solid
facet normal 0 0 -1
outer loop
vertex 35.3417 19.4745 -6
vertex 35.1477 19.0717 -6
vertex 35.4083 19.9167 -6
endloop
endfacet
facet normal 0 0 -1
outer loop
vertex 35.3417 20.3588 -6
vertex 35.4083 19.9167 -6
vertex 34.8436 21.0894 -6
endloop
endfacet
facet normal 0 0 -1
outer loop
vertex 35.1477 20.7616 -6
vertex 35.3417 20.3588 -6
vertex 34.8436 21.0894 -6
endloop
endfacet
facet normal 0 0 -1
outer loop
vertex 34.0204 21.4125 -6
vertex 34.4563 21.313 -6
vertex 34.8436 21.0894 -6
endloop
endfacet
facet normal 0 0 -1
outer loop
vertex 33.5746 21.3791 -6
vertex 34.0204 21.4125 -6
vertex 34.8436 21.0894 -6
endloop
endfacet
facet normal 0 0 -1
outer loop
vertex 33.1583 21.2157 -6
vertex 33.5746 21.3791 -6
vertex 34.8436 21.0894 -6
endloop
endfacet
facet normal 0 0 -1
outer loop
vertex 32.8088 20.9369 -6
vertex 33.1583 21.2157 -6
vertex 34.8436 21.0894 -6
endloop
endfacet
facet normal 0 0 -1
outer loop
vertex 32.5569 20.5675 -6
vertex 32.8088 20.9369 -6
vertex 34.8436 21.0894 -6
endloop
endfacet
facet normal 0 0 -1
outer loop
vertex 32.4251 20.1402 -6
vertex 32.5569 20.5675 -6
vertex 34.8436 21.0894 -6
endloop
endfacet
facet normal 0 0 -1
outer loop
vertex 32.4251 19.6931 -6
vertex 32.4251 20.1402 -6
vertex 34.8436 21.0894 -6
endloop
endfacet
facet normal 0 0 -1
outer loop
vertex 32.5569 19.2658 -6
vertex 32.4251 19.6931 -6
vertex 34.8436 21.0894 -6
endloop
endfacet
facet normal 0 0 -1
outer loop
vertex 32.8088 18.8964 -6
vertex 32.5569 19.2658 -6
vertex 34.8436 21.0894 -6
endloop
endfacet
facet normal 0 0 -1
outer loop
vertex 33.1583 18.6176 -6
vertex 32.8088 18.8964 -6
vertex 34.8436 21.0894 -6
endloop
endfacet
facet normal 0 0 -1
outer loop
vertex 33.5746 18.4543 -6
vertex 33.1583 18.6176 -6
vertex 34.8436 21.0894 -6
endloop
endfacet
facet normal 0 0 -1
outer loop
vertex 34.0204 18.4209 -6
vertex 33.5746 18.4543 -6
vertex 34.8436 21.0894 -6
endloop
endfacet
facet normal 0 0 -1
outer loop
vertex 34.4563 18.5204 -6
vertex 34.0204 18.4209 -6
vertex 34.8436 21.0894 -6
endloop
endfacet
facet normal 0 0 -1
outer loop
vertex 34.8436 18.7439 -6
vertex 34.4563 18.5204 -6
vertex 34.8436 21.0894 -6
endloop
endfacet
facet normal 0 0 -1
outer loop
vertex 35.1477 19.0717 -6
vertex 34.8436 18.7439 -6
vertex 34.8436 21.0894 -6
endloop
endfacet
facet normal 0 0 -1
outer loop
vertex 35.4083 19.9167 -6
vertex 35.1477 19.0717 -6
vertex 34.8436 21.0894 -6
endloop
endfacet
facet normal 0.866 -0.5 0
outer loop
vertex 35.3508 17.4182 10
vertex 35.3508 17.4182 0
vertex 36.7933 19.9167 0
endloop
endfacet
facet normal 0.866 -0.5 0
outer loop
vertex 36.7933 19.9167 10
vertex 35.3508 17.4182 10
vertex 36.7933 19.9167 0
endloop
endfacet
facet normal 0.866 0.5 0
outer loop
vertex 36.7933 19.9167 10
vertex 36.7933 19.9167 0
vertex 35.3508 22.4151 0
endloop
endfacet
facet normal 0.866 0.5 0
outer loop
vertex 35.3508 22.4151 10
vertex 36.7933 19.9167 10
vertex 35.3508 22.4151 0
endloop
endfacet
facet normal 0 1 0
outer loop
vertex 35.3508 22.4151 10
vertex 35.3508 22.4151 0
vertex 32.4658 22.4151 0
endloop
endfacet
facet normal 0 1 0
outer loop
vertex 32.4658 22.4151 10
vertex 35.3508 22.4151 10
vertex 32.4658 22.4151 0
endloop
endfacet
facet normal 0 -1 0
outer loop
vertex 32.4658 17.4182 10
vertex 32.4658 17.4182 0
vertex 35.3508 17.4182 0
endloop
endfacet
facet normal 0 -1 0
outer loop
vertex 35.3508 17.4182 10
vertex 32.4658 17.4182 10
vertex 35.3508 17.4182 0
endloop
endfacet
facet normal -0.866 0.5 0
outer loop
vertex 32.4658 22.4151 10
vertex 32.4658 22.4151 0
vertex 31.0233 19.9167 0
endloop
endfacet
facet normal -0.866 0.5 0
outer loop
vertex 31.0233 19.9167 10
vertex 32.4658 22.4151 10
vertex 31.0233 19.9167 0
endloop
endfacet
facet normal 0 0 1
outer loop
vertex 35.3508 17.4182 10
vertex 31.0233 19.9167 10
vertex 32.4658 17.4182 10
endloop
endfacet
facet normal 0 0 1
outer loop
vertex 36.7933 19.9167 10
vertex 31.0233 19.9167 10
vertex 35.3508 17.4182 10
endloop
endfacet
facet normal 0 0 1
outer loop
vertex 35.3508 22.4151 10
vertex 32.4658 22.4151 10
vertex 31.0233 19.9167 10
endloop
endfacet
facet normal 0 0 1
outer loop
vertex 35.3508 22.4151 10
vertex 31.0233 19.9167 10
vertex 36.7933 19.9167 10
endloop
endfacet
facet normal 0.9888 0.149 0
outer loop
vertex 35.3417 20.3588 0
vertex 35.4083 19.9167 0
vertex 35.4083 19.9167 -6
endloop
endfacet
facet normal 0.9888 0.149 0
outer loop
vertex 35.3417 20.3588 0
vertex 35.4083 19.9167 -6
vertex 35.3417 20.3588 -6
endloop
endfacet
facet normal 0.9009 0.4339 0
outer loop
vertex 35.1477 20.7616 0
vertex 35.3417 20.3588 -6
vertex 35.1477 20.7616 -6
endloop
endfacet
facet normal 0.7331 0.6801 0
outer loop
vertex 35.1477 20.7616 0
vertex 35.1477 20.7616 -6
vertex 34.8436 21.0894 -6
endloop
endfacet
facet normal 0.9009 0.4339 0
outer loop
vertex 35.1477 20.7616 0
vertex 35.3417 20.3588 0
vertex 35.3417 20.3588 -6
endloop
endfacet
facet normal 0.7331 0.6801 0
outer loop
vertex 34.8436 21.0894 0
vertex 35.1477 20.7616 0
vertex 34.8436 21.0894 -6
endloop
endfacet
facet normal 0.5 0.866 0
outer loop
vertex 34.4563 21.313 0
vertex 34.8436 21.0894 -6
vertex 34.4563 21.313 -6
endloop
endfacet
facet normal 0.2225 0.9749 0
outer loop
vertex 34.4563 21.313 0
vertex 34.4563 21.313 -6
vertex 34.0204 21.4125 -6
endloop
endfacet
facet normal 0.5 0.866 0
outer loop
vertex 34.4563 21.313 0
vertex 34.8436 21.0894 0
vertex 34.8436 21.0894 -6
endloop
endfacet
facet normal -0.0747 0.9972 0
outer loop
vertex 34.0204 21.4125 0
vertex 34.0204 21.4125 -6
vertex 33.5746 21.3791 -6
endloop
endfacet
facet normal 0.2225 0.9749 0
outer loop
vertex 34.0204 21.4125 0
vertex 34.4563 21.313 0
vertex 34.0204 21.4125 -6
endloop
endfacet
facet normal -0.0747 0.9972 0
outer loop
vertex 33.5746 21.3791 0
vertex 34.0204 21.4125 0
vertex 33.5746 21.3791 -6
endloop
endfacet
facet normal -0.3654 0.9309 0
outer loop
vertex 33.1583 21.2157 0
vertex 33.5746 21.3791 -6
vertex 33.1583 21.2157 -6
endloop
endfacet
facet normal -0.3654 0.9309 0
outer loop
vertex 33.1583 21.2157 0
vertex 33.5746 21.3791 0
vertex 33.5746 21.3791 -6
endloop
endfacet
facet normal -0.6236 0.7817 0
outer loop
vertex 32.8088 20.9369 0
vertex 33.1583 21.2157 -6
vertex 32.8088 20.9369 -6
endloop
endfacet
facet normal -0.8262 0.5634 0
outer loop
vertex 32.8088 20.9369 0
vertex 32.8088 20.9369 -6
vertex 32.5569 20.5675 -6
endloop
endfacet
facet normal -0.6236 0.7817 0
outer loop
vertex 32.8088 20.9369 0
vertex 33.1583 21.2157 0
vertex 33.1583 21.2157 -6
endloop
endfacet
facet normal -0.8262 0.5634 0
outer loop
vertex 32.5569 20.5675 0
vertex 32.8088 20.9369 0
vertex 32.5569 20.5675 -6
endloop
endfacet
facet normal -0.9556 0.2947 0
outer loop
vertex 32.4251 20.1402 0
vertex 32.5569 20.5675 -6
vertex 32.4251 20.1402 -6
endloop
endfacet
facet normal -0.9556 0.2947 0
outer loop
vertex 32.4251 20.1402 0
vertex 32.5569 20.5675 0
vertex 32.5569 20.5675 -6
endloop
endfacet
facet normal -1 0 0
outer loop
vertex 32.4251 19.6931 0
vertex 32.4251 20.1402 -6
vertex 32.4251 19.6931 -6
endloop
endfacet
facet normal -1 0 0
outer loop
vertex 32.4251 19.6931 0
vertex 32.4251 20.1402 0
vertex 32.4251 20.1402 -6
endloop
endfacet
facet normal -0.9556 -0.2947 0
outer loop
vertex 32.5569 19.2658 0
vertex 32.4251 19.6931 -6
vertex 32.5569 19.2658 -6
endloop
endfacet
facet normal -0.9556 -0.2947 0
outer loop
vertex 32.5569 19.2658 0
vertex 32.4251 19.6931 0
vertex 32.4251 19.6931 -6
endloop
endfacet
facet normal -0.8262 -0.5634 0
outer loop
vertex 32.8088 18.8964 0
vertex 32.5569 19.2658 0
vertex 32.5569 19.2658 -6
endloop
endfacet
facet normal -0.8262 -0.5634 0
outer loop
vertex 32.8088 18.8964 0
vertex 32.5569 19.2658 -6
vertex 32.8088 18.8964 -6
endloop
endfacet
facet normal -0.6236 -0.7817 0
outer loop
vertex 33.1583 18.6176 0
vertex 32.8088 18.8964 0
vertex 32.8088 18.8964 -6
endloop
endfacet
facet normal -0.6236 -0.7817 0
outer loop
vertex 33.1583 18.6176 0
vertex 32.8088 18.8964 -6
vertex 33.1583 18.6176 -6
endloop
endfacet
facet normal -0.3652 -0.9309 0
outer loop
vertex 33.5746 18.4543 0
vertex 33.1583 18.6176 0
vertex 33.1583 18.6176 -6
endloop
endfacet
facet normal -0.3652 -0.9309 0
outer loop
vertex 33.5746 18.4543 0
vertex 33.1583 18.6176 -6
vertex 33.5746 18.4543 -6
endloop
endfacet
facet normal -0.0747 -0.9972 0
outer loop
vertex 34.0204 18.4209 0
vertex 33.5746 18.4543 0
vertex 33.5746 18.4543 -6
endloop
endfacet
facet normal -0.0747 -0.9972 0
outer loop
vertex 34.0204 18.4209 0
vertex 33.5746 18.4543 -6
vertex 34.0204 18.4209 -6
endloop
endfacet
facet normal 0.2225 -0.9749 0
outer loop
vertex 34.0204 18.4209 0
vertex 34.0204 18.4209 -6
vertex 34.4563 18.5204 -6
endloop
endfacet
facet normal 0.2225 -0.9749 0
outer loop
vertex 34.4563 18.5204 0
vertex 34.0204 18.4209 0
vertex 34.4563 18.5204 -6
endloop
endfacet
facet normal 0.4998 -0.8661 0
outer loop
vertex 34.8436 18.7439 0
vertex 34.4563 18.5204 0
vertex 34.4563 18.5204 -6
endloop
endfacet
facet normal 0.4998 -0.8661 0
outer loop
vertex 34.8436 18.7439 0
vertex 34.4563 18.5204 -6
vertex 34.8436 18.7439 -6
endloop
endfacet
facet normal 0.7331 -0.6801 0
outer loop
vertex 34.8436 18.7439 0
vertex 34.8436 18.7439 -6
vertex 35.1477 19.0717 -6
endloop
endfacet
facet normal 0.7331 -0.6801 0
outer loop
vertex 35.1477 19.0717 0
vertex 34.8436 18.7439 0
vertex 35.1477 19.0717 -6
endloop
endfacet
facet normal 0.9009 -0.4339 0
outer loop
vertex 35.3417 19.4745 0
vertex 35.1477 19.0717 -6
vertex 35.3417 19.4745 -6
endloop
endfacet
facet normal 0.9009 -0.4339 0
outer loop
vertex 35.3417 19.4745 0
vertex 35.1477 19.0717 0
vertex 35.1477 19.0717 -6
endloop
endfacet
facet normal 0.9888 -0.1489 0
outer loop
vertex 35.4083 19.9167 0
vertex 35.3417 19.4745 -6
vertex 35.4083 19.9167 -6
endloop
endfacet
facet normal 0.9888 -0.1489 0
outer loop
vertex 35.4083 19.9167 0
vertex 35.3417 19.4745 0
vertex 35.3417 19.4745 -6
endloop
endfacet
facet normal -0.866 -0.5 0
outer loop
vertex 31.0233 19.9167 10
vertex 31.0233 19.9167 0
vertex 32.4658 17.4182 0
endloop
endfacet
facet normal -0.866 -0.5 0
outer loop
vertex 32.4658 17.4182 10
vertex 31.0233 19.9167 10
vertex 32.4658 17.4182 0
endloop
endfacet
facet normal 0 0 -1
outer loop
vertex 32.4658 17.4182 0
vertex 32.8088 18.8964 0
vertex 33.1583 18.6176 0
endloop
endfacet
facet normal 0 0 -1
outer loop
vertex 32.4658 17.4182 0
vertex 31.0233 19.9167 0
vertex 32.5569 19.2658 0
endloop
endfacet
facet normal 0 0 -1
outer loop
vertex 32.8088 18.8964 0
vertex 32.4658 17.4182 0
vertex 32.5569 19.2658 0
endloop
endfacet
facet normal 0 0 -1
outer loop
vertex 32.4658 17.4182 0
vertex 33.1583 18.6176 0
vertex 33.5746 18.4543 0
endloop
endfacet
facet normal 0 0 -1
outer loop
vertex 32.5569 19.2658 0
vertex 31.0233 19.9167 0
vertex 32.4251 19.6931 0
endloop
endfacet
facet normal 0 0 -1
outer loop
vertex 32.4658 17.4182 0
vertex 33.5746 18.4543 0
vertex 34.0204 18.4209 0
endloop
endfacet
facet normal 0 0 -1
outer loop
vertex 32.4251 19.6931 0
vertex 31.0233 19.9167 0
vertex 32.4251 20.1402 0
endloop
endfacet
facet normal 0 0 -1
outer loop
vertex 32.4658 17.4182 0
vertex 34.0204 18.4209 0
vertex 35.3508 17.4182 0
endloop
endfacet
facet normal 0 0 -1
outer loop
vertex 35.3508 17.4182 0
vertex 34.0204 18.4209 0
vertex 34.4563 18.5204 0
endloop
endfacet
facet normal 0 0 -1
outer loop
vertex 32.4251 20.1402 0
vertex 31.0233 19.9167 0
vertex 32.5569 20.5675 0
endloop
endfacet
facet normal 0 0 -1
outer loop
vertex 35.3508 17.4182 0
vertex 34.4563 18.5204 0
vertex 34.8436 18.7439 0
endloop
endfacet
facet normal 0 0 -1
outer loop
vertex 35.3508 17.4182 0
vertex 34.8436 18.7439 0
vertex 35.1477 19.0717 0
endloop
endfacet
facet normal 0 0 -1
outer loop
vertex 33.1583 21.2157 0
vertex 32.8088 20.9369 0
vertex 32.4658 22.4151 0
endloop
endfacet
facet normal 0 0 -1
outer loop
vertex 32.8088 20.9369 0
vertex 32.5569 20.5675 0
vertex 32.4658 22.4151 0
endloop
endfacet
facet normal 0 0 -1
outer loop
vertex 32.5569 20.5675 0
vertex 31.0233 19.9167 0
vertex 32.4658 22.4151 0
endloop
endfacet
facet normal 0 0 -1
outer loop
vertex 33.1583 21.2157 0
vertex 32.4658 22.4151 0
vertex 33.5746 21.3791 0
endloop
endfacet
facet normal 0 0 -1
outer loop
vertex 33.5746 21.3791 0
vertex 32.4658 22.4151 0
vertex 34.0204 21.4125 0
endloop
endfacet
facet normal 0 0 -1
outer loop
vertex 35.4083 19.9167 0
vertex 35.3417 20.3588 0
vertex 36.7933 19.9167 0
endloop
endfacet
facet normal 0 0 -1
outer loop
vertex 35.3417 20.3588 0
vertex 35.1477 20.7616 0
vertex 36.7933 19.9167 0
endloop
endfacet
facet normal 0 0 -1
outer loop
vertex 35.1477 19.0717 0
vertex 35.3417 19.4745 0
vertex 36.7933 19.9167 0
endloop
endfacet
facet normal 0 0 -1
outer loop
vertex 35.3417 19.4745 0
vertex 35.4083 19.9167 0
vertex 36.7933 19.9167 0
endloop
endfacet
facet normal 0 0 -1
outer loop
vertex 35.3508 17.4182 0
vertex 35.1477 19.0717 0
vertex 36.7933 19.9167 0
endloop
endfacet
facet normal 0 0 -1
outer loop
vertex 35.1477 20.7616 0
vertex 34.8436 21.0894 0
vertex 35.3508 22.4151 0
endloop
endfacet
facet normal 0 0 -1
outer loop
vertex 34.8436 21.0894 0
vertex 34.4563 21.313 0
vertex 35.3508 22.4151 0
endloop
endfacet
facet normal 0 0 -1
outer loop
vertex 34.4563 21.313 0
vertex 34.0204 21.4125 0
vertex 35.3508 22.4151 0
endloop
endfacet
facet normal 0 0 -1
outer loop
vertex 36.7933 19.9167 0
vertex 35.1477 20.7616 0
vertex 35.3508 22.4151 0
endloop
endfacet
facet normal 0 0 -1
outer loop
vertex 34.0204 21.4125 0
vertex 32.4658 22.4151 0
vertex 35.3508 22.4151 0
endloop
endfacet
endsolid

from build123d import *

# Parameters (mm, degrees)
SALIENTE_EXTRUIR1_DEPTH = 10
CORTE_EXTERIOR_R        = 1.5
SALIENTE_EXTRUIR2_DEPTH = 6


with BuildPart() as part:
    # Sketch 0 → Saliente-Extruir1 (new body)
    with BuildSketch(Plane.XY):
        Polygon((35.350833333, 22.415149957), (32.465833333, 22.415149957), (31.023333333, 19.916666667), (32.465833333, 17.418183377), (35.350833333, 17.418183377), (36.793333333, 19.916666667), align=None)
    extrude(amount=SALIENTE_EXTRUIR1_DEPTH)

    # Corte exterior → Saliente-Extruir2 (add)
    with BuildSketch(Plane.XY):
        with Locations((33.908333333, 19.916666667)):
            Circle(CORTE_EXTERIOR_R)
    extrude(amount=-SALIENTE_EXTRUIR2_DEPTH)


solid = part.part
